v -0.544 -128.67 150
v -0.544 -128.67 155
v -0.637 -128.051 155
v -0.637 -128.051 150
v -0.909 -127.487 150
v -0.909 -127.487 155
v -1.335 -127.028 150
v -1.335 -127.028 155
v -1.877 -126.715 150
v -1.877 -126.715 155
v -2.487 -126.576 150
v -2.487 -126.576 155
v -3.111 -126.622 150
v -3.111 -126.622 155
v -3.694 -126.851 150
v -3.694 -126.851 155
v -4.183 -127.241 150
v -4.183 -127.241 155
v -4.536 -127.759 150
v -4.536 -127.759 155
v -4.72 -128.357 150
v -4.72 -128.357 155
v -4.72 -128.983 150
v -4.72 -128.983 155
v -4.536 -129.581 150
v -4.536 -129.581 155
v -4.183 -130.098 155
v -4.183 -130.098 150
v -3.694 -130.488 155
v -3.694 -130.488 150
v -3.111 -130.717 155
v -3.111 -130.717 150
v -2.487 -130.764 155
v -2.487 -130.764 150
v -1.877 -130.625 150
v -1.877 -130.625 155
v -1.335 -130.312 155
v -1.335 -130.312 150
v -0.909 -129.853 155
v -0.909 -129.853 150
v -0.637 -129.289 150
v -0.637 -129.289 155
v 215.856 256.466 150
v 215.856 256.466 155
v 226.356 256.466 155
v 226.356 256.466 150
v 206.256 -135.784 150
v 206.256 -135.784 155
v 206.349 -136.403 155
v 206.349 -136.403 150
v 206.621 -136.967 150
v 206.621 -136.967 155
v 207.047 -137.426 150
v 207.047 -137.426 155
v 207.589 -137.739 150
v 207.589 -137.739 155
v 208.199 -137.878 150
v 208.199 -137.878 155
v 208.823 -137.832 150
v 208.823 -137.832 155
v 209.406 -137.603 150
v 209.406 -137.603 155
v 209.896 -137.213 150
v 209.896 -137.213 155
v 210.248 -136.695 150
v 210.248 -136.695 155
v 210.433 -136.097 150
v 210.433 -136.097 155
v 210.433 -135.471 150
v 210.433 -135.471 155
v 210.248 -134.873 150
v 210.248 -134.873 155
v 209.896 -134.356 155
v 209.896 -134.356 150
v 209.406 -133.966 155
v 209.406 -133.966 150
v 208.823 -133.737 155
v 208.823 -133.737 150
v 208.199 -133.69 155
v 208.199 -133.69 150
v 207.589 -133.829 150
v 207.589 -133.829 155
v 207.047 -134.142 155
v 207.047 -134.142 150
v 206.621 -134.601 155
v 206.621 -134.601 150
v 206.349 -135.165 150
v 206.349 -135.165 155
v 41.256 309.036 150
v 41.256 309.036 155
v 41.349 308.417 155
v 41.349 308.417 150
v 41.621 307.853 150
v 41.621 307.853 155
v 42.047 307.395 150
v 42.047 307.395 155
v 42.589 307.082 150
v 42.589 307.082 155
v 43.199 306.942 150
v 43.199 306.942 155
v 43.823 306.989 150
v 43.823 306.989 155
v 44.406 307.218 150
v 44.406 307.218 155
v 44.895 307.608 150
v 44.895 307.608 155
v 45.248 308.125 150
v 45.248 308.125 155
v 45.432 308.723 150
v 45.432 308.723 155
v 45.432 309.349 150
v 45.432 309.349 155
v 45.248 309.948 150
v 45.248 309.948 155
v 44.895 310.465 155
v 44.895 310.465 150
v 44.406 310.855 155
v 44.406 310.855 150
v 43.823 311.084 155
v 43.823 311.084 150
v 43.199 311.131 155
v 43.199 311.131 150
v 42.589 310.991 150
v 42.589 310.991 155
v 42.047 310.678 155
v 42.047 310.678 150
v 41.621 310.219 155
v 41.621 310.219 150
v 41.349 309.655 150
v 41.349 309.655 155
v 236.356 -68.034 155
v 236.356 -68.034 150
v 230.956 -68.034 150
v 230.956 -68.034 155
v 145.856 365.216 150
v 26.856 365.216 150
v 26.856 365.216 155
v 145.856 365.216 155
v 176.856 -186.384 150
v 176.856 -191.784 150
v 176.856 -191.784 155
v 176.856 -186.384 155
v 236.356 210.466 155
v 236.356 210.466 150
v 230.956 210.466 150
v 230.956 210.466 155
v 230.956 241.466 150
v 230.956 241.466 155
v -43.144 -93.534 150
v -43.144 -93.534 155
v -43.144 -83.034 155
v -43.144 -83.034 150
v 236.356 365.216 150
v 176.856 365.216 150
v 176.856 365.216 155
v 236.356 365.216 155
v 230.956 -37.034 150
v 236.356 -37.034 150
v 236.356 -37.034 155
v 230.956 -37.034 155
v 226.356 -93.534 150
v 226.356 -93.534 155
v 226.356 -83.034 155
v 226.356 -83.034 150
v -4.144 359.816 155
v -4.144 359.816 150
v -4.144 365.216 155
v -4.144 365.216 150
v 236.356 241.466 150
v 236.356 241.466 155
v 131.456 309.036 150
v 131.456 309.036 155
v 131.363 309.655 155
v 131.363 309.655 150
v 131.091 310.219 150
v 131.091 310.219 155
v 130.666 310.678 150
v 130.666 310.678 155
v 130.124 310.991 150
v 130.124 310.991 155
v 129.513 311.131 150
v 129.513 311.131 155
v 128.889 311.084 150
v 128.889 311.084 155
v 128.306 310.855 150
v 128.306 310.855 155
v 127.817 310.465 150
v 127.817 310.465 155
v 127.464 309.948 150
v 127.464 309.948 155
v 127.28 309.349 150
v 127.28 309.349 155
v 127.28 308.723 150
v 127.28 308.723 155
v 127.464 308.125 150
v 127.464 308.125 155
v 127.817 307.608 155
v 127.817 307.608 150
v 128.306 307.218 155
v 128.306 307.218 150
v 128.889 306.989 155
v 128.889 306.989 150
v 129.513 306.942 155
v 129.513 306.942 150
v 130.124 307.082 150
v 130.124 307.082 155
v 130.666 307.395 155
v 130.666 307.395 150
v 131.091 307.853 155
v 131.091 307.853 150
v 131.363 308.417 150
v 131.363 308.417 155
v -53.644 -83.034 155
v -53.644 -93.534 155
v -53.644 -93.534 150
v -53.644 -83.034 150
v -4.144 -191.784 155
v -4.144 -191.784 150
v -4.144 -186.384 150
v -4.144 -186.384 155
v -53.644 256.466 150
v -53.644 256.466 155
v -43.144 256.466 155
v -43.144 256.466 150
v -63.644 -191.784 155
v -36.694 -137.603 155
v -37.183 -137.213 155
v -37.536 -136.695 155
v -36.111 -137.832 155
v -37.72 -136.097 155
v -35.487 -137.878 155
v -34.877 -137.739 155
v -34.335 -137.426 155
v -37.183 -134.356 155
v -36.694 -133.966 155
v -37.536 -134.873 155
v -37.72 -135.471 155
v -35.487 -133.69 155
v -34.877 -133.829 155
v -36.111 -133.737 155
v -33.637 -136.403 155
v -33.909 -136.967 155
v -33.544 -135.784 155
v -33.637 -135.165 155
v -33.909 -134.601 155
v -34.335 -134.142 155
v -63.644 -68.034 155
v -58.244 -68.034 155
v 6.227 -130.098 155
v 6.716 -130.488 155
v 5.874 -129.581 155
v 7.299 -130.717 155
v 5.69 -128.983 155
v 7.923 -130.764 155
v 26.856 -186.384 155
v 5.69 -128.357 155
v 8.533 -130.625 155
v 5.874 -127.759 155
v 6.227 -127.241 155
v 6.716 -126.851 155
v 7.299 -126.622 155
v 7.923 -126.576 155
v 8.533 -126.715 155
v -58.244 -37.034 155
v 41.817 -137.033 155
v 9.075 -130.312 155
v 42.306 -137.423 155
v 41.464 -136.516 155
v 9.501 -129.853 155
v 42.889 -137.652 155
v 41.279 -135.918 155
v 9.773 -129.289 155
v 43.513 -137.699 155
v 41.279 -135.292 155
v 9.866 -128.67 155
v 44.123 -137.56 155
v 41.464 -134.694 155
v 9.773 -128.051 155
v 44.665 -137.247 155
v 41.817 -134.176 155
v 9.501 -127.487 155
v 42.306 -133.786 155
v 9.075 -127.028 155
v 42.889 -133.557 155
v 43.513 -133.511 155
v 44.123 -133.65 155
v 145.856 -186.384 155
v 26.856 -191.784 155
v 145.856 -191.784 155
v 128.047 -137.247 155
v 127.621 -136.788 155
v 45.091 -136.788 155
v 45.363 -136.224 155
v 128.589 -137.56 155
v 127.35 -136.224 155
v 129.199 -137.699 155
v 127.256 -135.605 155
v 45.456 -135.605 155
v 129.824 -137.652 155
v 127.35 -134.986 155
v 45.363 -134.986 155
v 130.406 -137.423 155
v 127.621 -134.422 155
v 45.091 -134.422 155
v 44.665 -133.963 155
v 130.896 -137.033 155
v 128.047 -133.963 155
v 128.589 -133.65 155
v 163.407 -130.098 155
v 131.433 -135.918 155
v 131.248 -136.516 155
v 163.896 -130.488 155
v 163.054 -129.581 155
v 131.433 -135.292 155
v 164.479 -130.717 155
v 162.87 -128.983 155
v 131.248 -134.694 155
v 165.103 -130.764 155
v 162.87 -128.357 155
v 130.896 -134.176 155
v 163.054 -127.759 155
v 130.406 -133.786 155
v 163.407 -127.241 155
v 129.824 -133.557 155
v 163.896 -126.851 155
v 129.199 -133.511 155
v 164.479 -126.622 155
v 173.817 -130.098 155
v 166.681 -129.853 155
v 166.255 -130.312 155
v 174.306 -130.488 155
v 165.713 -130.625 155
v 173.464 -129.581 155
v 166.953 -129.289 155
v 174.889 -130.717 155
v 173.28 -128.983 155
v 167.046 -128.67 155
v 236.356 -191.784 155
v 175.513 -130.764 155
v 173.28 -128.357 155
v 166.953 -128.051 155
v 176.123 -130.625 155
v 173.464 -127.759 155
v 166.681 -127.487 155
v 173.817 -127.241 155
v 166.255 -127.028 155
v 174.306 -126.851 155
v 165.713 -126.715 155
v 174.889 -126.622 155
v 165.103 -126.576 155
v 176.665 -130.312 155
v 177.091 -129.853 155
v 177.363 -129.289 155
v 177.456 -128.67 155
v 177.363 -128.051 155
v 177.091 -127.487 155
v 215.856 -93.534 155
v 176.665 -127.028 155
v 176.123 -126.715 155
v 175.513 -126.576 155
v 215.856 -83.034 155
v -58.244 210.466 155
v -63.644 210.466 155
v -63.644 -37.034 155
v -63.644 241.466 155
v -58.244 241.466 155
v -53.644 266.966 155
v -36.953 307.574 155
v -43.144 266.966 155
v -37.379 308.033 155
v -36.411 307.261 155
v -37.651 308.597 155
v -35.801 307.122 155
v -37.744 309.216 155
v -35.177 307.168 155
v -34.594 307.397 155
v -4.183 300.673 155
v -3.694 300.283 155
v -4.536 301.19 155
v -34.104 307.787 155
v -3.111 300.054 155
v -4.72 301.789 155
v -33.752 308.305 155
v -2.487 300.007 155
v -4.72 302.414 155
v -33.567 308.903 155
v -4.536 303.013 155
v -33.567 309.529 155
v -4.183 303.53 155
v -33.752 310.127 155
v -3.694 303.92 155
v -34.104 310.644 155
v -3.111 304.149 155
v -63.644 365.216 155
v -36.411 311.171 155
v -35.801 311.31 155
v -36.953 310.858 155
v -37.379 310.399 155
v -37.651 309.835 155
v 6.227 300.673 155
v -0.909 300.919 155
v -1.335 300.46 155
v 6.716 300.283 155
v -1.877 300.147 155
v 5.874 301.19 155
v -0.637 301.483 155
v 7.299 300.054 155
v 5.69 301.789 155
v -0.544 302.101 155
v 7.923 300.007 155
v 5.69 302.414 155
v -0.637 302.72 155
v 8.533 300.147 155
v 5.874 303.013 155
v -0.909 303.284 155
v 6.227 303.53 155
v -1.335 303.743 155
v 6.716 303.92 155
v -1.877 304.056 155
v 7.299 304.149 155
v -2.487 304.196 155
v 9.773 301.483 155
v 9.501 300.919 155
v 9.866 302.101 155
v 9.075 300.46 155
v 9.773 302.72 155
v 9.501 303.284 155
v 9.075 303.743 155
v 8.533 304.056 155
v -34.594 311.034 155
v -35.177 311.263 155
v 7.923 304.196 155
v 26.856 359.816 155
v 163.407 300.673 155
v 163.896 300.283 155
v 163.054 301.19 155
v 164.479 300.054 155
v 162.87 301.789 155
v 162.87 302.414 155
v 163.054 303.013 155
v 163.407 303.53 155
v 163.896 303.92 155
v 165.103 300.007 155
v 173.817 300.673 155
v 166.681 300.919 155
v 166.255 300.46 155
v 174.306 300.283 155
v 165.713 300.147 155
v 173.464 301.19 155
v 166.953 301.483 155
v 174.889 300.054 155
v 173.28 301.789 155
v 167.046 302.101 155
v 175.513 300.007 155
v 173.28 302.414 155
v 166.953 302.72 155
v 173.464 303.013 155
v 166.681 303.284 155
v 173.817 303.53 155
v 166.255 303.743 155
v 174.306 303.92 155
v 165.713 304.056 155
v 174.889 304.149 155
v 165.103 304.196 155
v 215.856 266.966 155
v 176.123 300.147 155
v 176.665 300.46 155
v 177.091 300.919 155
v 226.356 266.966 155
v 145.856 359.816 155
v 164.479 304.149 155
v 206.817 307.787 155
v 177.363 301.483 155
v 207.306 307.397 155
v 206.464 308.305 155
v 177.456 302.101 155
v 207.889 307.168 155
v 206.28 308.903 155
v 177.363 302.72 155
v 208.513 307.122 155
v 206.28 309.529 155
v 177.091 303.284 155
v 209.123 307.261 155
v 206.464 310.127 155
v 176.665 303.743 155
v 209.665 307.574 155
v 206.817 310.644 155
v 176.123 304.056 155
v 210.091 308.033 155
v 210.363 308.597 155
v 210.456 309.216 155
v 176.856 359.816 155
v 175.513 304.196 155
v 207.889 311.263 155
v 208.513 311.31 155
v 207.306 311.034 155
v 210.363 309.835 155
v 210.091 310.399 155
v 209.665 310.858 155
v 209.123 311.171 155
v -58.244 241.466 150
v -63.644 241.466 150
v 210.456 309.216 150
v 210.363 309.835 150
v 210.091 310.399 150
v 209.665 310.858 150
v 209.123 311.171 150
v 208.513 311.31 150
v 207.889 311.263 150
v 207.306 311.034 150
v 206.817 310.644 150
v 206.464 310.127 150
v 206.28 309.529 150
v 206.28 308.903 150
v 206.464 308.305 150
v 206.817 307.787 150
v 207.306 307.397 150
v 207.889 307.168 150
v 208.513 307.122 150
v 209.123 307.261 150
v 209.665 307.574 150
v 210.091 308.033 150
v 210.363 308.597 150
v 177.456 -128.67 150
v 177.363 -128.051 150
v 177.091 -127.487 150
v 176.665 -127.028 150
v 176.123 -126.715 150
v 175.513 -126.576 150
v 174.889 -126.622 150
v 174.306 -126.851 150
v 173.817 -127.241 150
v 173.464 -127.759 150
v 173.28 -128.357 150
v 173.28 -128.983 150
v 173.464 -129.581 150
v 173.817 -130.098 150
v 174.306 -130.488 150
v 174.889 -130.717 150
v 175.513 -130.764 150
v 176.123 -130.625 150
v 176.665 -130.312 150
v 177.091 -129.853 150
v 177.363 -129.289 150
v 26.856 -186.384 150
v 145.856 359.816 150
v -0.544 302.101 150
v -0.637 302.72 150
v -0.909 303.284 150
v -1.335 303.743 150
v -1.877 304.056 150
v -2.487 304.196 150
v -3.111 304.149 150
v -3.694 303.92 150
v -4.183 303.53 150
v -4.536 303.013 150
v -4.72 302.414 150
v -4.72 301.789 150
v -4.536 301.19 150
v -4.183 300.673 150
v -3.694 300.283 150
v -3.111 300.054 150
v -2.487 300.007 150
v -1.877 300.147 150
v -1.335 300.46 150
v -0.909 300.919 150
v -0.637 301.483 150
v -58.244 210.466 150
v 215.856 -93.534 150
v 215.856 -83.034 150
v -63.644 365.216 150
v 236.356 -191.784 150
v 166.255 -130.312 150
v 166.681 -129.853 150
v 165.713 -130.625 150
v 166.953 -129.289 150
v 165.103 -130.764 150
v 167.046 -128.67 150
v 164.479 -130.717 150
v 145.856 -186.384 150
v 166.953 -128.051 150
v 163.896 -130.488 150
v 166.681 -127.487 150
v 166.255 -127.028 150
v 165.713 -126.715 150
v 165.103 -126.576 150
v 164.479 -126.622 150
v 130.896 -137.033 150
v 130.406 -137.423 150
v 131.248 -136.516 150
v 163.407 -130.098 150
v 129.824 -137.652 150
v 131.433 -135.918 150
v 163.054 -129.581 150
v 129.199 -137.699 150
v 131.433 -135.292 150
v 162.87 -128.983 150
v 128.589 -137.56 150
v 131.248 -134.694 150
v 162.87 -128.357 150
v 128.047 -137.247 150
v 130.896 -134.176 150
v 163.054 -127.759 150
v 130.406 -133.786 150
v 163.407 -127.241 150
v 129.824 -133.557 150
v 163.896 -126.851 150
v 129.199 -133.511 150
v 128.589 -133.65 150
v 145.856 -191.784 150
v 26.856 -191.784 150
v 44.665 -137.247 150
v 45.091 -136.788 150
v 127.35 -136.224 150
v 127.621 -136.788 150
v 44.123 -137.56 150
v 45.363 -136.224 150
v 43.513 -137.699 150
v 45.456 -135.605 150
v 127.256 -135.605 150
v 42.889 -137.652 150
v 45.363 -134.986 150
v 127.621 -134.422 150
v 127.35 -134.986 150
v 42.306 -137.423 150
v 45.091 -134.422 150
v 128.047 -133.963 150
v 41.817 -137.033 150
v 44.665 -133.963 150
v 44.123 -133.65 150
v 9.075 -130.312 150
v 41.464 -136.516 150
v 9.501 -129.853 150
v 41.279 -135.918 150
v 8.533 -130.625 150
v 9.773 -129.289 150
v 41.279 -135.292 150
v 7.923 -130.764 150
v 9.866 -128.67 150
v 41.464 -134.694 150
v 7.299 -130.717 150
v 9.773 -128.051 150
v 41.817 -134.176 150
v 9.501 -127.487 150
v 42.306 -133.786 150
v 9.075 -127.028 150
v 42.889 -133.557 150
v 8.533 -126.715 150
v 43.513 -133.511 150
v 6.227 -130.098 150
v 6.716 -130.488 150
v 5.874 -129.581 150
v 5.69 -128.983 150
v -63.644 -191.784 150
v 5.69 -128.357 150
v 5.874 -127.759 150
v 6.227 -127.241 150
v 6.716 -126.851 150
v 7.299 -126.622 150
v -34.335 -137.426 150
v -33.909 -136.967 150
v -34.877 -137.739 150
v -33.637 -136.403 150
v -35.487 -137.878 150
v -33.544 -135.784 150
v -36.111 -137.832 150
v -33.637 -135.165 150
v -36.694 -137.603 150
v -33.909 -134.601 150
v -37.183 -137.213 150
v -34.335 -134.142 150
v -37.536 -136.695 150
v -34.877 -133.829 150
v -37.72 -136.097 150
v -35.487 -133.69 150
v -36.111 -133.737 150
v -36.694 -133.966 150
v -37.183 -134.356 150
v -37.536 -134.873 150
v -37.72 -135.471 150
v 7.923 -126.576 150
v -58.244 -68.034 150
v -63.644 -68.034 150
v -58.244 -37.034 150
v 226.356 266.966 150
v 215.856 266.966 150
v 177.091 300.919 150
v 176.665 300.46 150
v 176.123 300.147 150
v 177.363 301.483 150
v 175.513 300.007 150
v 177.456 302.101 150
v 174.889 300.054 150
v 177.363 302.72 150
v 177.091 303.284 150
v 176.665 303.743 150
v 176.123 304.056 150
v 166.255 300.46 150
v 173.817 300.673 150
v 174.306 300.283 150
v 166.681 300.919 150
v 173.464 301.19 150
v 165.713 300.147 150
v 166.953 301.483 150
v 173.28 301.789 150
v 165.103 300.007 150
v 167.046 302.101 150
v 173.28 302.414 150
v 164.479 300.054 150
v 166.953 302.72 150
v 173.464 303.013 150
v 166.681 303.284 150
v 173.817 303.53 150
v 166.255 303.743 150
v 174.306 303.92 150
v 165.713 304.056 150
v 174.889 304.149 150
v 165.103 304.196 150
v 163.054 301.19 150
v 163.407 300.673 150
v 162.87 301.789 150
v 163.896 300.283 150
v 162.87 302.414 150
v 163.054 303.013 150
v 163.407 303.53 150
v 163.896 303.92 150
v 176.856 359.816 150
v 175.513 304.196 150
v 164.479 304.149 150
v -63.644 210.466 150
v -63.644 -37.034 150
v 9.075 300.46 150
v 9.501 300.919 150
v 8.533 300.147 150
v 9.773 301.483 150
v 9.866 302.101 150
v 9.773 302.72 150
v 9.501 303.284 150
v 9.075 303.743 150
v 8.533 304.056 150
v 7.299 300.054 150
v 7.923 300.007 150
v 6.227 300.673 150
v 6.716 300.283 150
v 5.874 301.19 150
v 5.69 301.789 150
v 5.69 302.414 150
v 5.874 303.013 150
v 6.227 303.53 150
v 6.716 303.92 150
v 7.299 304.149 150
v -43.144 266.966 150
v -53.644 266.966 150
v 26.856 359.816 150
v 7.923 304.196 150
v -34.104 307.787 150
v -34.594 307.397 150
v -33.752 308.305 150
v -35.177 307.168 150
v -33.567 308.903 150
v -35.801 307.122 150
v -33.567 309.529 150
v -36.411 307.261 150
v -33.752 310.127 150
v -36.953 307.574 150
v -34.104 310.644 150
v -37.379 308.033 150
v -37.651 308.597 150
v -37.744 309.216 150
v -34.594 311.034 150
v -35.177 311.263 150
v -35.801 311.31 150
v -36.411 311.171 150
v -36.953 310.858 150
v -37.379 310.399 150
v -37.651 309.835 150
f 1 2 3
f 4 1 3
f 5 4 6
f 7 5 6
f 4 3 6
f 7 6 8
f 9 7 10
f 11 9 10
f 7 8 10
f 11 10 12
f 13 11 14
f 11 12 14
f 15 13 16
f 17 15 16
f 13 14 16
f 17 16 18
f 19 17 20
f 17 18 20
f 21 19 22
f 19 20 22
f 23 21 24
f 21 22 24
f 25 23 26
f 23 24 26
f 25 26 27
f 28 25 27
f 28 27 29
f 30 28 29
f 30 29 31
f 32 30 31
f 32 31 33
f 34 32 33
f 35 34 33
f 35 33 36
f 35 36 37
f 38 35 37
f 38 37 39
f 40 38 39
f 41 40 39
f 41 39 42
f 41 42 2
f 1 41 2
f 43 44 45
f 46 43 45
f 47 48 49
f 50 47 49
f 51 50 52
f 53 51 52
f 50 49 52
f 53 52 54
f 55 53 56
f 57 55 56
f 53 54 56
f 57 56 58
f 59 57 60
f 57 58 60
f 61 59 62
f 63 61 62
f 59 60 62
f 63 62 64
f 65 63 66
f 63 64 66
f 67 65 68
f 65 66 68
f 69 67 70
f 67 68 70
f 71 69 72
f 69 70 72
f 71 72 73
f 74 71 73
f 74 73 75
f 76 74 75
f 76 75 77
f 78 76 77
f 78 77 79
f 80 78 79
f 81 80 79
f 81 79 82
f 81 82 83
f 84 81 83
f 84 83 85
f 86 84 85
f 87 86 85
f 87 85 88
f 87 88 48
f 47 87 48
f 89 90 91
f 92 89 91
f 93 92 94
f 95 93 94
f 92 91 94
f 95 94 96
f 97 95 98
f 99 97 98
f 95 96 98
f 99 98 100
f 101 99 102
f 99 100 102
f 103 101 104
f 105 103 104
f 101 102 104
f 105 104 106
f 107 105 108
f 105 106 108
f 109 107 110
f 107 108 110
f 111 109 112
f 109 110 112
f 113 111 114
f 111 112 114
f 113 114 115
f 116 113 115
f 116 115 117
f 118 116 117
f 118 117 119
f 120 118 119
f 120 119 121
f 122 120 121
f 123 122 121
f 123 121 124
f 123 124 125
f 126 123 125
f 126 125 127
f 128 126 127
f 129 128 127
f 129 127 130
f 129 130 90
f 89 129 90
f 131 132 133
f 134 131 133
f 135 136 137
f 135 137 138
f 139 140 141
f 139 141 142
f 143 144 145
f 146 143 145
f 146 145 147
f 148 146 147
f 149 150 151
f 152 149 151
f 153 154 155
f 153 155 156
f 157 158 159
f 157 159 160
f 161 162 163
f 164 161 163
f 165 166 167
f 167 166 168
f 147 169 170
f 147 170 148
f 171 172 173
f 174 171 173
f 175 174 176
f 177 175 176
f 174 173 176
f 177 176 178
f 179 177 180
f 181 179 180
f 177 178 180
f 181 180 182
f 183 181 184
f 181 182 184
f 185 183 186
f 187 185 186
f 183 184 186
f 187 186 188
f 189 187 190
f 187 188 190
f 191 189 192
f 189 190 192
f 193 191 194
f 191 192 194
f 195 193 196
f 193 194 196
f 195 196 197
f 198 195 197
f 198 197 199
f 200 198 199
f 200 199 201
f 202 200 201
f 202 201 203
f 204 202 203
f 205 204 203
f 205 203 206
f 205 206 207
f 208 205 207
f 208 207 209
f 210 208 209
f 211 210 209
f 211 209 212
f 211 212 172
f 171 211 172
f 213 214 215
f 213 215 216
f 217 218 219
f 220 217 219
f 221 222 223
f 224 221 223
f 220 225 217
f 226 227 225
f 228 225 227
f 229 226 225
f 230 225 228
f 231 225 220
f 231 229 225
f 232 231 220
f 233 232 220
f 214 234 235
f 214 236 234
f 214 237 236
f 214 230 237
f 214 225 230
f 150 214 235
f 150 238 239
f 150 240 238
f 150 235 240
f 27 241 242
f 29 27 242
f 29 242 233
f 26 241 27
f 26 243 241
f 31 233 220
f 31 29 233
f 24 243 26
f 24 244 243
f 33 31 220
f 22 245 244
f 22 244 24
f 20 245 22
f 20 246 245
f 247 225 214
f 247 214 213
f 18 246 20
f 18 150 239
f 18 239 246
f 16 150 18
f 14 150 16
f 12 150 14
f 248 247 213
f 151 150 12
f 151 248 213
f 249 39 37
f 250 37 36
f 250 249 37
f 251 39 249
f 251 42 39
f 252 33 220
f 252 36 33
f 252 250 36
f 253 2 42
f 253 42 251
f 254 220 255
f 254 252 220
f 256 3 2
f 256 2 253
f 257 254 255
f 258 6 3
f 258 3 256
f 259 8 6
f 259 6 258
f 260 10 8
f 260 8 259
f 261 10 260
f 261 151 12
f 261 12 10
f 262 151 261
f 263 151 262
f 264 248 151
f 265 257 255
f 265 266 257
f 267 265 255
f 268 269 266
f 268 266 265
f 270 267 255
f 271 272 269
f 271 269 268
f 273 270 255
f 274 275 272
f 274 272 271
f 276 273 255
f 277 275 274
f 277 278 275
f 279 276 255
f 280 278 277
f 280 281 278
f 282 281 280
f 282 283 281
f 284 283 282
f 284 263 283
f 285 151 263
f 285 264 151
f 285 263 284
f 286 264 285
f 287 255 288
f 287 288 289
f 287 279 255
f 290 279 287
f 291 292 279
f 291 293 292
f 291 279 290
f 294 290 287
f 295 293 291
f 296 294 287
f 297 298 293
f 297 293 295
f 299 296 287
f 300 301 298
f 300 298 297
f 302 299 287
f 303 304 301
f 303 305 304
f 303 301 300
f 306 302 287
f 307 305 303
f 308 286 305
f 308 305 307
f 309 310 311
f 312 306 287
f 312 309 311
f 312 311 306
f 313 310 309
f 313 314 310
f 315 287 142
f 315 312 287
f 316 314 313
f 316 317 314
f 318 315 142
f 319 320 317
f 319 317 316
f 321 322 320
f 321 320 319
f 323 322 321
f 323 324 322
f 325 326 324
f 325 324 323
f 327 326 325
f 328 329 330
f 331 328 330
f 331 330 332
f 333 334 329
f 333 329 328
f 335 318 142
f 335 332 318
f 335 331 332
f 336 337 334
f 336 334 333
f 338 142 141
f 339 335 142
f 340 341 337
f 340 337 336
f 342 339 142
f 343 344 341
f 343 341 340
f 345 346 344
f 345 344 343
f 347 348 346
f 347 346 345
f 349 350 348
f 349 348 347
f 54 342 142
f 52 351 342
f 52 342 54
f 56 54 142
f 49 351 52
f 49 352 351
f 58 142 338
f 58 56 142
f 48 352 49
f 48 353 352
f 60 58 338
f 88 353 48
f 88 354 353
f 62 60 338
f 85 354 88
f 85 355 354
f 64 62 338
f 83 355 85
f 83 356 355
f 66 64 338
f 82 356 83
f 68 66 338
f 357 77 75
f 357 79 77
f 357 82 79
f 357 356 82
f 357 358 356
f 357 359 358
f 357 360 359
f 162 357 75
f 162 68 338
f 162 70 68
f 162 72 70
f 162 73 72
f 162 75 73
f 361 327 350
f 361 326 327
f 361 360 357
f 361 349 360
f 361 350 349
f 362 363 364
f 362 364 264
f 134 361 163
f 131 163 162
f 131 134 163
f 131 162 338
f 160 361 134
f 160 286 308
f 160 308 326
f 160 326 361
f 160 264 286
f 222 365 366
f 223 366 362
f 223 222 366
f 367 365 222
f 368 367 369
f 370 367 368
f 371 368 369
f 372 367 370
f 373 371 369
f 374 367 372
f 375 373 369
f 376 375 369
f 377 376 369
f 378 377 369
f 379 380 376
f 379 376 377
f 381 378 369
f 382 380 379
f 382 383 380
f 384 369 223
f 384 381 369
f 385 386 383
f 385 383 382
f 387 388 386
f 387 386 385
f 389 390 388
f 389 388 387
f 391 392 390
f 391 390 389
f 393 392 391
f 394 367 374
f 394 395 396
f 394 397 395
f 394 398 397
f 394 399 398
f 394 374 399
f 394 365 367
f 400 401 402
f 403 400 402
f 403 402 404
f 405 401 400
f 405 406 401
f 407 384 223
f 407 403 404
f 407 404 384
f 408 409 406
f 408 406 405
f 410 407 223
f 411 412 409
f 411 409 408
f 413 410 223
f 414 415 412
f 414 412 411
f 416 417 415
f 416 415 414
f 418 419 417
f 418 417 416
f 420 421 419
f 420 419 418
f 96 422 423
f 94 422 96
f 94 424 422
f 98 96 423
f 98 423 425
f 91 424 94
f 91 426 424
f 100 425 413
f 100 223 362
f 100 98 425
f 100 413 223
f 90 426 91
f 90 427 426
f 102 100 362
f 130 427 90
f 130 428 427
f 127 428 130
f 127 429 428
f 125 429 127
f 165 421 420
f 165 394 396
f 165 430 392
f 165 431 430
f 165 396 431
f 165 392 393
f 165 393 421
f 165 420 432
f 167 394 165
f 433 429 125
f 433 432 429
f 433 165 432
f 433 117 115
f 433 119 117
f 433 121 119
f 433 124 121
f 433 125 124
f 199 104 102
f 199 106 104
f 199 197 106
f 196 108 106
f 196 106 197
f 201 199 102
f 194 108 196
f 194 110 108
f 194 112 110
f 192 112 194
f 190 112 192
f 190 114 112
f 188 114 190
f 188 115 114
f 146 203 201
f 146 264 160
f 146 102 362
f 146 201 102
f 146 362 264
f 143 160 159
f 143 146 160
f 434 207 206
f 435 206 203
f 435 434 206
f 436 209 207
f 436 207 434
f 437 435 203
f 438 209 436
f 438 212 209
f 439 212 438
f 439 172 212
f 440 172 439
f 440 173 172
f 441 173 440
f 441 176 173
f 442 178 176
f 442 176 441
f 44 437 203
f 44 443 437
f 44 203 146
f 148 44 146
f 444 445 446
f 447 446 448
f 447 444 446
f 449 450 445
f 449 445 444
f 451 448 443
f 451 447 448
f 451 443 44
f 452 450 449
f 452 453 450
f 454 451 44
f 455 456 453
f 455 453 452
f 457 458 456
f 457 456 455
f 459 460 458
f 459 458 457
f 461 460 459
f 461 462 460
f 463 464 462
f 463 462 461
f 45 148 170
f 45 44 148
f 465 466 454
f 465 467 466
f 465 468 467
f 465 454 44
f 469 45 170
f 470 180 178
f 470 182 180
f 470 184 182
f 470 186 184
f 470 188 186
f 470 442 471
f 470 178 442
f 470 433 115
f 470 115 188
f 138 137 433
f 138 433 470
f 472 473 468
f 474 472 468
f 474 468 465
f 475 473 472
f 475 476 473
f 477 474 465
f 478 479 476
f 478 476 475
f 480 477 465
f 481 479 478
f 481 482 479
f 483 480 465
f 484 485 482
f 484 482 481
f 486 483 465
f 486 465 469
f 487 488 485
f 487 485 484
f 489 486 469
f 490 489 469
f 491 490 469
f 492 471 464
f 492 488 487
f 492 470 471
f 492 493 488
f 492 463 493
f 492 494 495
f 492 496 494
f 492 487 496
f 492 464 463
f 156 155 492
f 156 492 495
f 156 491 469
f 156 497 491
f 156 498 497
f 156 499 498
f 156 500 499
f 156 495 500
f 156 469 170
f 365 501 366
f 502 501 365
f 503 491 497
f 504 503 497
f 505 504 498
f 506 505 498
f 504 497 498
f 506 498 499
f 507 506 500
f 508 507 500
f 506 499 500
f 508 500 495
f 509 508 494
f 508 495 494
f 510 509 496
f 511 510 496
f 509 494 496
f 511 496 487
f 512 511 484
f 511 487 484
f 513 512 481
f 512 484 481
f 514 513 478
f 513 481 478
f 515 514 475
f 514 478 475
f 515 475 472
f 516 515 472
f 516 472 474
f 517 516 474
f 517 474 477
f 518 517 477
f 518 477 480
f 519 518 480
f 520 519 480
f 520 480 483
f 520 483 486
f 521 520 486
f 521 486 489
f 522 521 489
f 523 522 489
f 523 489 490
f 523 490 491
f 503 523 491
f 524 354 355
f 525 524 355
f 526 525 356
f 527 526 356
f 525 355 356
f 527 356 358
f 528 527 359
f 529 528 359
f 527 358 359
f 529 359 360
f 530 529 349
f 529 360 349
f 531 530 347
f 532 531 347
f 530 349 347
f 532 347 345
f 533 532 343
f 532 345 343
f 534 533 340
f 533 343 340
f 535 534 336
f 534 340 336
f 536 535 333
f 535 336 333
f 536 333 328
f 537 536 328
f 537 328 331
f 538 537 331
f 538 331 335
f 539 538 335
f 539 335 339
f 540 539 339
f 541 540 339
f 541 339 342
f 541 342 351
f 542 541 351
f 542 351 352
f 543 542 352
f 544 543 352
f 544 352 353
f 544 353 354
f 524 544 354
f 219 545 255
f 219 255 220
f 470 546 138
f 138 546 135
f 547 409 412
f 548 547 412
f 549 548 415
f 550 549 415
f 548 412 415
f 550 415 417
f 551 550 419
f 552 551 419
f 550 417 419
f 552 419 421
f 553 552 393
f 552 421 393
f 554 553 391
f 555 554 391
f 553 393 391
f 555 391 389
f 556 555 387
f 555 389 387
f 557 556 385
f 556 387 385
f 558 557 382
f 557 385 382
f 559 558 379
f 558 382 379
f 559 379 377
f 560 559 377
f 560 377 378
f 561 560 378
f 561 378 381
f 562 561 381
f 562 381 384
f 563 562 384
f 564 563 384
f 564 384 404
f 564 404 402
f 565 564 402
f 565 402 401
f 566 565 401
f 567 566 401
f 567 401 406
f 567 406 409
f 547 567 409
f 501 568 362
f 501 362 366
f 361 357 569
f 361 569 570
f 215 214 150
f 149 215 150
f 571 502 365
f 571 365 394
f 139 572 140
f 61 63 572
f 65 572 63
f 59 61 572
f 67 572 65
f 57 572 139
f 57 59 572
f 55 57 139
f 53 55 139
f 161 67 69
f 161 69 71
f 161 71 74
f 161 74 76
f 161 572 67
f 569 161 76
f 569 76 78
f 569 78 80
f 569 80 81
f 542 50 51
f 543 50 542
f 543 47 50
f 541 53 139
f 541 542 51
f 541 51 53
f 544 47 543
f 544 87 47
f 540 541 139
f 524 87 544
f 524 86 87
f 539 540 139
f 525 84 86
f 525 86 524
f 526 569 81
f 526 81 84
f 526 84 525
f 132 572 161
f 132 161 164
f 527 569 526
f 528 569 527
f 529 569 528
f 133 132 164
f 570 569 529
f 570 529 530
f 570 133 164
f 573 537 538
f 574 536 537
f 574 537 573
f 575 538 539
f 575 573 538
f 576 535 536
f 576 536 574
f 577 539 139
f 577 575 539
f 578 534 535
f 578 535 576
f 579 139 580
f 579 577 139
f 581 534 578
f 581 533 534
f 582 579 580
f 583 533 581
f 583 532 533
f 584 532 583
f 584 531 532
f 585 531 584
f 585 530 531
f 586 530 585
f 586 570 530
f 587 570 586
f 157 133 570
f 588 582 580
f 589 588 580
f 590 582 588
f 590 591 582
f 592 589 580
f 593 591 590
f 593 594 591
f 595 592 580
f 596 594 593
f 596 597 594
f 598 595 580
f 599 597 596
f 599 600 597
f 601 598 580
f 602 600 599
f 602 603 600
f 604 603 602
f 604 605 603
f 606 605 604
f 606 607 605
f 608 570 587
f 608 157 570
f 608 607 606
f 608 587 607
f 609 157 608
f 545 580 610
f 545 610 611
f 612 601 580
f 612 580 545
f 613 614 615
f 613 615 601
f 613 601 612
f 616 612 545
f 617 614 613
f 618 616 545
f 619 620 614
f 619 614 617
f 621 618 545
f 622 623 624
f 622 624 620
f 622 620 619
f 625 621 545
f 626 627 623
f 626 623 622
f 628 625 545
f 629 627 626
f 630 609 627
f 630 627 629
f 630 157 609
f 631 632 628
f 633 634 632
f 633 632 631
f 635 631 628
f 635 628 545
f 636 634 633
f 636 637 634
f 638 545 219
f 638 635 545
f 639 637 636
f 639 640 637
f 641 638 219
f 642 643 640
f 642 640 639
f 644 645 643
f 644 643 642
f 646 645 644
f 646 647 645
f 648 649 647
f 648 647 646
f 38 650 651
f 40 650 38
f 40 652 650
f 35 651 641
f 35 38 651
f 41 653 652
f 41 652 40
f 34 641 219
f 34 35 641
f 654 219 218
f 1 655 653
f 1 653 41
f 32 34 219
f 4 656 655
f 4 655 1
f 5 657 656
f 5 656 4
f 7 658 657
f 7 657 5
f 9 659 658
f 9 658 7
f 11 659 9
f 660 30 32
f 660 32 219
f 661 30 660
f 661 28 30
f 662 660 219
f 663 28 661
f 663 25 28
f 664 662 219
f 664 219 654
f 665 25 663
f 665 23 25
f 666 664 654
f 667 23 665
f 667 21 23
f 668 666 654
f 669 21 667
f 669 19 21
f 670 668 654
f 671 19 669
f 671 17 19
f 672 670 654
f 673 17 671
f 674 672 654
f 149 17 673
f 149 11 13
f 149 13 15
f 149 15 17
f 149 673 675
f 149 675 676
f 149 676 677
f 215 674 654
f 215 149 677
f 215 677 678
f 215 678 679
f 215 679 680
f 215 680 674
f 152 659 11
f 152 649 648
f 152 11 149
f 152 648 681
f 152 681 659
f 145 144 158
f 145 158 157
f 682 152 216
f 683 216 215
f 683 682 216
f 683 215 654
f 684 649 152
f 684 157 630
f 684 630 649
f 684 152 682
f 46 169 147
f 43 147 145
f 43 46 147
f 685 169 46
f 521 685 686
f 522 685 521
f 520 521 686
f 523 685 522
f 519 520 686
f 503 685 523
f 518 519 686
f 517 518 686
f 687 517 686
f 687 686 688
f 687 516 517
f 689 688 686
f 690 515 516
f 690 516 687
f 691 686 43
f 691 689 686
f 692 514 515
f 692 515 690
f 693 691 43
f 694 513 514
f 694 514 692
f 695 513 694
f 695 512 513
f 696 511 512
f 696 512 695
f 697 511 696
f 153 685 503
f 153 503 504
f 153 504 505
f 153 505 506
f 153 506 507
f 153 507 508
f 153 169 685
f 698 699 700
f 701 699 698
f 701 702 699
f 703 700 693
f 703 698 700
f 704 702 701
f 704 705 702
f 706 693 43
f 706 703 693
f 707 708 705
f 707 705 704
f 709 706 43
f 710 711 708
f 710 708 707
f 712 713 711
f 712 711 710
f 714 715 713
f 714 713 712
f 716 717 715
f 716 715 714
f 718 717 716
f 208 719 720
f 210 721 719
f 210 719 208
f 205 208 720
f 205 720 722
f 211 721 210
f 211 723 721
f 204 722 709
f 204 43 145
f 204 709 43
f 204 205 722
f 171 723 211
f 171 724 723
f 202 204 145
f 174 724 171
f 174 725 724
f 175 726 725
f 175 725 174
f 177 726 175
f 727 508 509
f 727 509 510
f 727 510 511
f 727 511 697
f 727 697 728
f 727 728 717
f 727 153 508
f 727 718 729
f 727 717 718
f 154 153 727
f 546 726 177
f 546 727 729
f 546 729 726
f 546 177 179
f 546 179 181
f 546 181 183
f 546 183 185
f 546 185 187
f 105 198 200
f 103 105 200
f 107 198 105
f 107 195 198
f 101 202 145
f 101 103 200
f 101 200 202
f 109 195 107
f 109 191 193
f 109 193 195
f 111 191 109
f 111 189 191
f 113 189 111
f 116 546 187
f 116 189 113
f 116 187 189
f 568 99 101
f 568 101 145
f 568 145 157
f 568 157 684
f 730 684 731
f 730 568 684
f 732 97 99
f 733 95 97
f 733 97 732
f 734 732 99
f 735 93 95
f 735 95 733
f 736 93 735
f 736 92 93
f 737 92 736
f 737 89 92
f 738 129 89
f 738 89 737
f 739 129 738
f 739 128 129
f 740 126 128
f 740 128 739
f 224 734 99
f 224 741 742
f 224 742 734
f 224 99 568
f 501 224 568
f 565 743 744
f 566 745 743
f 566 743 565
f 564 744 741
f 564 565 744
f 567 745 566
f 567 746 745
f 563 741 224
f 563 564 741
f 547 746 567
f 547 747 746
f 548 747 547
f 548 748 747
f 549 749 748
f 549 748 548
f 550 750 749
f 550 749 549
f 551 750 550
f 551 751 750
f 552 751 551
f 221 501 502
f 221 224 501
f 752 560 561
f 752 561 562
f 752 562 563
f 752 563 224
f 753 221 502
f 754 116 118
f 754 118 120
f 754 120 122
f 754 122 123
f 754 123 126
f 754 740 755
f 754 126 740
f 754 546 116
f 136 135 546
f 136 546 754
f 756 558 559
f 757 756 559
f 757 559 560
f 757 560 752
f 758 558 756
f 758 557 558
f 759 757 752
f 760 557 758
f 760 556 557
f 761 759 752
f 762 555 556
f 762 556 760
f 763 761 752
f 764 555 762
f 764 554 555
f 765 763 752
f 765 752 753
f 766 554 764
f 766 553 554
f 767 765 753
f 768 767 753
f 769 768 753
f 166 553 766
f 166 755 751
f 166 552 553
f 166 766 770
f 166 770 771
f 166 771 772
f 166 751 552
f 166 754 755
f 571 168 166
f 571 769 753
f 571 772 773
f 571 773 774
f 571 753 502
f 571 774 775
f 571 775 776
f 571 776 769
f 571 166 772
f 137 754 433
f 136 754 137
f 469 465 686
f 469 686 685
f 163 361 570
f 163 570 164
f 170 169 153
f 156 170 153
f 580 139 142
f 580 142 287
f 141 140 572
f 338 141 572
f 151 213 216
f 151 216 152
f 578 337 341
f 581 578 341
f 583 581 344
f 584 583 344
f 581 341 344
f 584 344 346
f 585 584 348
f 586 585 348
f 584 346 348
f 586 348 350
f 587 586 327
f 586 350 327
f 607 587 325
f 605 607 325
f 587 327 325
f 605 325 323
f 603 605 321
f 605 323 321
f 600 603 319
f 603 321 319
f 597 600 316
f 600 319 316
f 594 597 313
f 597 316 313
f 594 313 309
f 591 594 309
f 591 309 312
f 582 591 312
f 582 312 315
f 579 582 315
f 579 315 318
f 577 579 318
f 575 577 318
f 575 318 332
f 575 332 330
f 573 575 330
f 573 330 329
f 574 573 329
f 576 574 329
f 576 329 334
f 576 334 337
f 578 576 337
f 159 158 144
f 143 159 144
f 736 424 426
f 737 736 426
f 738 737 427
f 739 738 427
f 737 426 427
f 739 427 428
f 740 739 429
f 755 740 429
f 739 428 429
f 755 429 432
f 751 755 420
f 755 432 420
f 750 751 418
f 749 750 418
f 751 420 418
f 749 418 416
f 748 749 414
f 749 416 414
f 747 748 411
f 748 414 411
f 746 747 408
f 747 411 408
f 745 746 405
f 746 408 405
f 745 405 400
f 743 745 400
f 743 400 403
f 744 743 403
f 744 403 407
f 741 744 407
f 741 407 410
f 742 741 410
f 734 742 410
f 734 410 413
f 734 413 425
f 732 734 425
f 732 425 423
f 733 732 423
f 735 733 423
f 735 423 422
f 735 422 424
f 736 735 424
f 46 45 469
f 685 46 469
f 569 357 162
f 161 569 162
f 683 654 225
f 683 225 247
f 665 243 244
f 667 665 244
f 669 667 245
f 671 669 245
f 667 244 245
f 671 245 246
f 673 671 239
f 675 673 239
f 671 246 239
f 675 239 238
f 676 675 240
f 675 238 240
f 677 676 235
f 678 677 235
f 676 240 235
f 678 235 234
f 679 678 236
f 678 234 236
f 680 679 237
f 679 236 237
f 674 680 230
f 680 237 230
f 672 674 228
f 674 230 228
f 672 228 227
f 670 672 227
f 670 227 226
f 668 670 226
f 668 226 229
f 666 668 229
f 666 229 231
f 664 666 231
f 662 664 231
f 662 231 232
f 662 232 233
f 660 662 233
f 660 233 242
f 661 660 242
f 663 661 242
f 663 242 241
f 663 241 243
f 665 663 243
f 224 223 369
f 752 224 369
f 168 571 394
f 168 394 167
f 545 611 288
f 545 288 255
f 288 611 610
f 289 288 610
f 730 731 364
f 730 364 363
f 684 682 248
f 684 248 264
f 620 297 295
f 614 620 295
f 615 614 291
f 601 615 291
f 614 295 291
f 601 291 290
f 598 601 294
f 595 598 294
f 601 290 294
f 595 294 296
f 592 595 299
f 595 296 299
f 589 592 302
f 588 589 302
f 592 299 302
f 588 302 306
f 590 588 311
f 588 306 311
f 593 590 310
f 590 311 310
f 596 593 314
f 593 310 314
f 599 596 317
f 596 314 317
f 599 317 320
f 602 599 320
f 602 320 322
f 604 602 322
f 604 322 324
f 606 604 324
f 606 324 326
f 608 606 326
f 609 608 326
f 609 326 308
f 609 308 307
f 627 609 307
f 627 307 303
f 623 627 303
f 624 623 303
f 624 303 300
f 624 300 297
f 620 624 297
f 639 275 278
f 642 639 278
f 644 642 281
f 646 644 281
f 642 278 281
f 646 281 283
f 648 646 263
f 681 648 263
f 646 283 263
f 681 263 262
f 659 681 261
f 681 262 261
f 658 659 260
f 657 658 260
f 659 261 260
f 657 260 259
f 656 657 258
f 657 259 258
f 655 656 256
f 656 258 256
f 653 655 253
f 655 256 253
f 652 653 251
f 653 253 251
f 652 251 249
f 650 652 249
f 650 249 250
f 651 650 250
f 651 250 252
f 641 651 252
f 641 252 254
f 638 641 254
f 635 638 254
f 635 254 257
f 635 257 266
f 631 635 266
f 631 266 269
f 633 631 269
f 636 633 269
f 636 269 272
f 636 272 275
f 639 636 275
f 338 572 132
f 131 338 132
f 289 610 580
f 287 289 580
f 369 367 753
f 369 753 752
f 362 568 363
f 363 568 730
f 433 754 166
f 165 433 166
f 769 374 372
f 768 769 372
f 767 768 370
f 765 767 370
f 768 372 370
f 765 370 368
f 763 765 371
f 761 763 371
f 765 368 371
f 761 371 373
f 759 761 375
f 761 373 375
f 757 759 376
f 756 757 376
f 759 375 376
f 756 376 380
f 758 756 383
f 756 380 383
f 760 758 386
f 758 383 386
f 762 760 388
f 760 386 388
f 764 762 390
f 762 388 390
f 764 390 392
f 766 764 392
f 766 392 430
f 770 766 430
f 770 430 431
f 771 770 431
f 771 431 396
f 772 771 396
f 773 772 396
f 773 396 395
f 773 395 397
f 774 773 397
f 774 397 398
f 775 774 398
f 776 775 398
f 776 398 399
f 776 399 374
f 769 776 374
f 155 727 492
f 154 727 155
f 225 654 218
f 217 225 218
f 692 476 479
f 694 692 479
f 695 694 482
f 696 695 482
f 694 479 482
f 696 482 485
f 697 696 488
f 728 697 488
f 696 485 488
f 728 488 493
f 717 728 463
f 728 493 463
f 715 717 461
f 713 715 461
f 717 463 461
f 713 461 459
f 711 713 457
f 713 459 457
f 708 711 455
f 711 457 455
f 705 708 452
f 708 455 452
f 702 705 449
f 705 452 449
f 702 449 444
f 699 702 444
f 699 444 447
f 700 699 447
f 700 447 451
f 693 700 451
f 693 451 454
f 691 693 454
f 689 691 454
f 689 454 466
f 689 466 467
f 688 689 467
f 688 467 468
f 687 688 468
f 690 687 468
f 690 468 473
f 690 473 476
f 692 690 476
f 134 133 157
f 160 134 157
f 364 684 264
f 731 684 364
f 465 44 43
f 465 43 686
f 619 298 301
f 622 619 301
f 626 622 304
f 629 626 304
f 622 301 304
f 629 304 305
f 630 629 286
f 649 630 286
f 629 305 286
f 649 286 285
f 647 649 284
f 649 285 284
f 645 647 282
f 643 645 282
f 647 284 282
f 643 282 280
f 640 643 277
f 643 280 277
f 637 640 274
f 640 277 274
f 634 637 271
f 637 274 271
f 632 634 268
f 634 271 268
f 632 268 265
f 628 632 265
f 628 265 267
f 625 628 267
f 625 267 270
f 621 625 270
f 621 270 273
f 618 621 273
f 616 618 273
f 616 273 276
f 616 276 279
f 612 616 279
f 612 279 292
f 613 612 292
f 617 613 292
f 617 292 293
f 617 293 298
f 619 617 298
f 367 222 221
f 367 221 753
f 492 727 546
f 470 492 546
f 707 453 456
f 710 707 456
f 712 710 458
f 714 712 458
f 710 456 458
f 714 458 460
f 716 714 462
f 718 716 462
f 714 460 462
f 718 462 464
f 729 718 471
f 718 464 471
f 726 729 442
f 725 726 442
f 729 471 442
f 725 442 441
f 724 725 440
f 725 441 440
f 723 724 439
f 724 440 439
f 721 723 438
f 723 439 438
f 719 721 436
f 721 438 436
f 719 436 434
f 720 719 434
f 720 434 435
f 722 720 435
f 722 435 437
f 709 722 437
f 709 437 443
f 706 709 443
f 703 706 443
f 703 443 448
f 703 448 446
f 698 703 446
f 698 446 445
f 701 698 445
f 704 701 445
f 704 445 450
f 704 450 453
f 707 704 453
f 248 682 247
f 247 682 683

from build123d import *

# Parameters (mm, degrees)
SKETCH1_W           = 300
SKETCH1_H           = 557
SKETCH1_W_2         = 290
SKETCH1_H_2         = 547
BOSS_EXTRUDE1_DEPTH = 150
SKETCH2_W           = 300
SKETCH2_H           = 557
BOSS_EXTRUDE2_DEPTH = 5
SKETCH5_R           = 2.1
CUT_EXTRUDE3_DEPTH  = 10
SKETCH6_W           = 10.5
SKETCH6_H           = 10.5
CUT_EXTRUDE4_DEPTH  = 10
SKETCH8_R           = 1.25
CUT_EXTRUDE6_DEPTH  = 663
SKETCH9_W           = 300
SKETCH9_H           = 557
CUT_EXTRUDE7_DEPTH  = 150
SKETCH10_W          = 31
SKETCH10_H          = 10.8
CUT_EXTRUDE8_DEPTH  = 5
SKETCH13_W          = 10.8
SKETCH13_H          = 31
CUT_EXTRUDE10_DEPTH = 5
SKETCH16_R          = 2.1
CUT_EXTRUDE12_DEPTH = 10


with BuildPart() as part:
    # Sketch1 → Boss-Extrude1 (new body)
    with BuildSketch(Plane.XY):
        with Locations((86.356154307, 86.715846067)):
            Rectangle(SKETCH1_W, SKETCH1_H)
        with Locations((86.356154307, 86.715846067)):
            Rectangle(SKETCH1_W_2, SKETCH1_H_2, mode=Mode.SUBTRACT)
    extrude(amount=BOSS_EXTRUDE1_DEPTH)

    # Sketch2 → Boss-Extrude2 (add)
    with BuildSketch(Plane.XY.offset(150)):
        with Locations((86.356154307, 86.715846067)):
            Rectangle(SKETCH2_W, SKETCH2_H)
    extrude(amount=BOSS_EXTRUDE2_DEPTH)

    # Sketch5 → Cut-Extrude3 (cut)
    with BuildSketch(Plane.XY.offset(155)):
        with Locations((7.766154307, 302.101499848)):
            Circle(SKETCH5_R)
        with Locations((-2.643845693, 302.101499848)):
            Circle(SKETCH5_R)
        with Locations((175.356154307, 302.101499848)):
            Circle(SKETCH5_R)
        with Locations((164.946154307, 302.101499848)):
            Circle(SKETCH5_R)
        with Locations((-2.643845693, -128.669807714)):
            Circle(SKETCH5_R)
        with Locations((7.766154307, -128.669807714)):
            Circle(SKETCH5_R)
        with Locations((164.946154307, -128.669807714)):
            Circle(SKETCH5_R)
        with Locations((175.356154307, -128.669807714)):
            Circle(SKETCH5_R)
    extrude(amount=-CUT_EXTRUDE3_DEPTH, mode=Mode.SUBTRACT)

    # Sketch6 → Cut-Extrude4 (cut)
    with BuildSketch(Plane.XY.offset(155)):
        with Locations((-48.393845693, 261.715846067)):
            Rectangle(SKETCH6_W, SKETCH6_H)
        with Locations((221.106154307, 261.715846067)):
            Rectangle(SKETCH6_W, SKETCH6_H)
        with Locations((221.106154307, -88.284153933)):
            Rectangle(SKETCH6_W, SKETCH6_H)
        with Locations((-48.393845693, -88.284153933)):
            Rectangle(SKETCH6_W, SKETCH6_H)
    extrude(amount=-CUT_EXTRUDE4_DEPTH, mode=Mode.SUBTRACT)

    # Sketch8 → Cut-Extrude6 (cut)
    with BuildSketch(Plane.XZ.offset(191.784153933)):
        with Locations(Location((91.506154307, 9.8, 0), (0, 0, 270))):
            Circle(SKETCH8_R)
        with Locations(Location((81.206154307, 9.8, 0), (0, 0, 270))):
            Circle(SKETCH8_R)
    extrude(amount=-CUT_EXTRUDE6_DEPTH, mode=Mode.SUBTRACT)

    # Sketch9 → Cut-Extrude7 (cut)
    with BuildSketch(Plane(origin=(0, 0, 0), x_dir=(-1, 0, 0), z_dir=(0, 0, -1))):
        with Locations((-86.356154307, 86.715846067)):
            Rectangle(SKETCH9_W, SKETCH9_H)
    extrude(amount=-CUT_EXTRUDE7_DEPTH, mode=Mode.SUBTRACT)

    # Sketch10 → Cut-Extrude8 (cut)
    with BuildSketch(Plane(origin=(0, 0, 150), x_dir=(-1, 0, 0), z_dir=(0, 0, -1))):
        with Locations((-11.356154307, -191.784153933)):
            Rectangle(SKETCH10_W, SKETCH10_H)
        with Locations((-161.356154307, -191.784153933)):
            Rectangle(SKETCH10_W, SKETCH10_H)
        with Locations((-161.356154307, 365.215846067)):
            Rectangle(SKETCH10_W, SKETCH10_H)
        with Locations((-11.356154307, 365.215846067)):
            Rectangle(SKETCH10_W, SKETCH10_H)
    extrude(amount=-CUT_EXTRUDE8_DEPTH, mode=Mode.SUBTRACT)

    # Sketch13 → Cut-Extrude10 (cut)
    with BuildSketch(Plane(origin=(0, 0, 150), x_dir=(-1, 0, 0), z_dir=(0, 0, -1))):
        with Locations((63.643845693, -52.534153933)):
            Rectangle(SKETCH13_W, SKETCH13_H)
        with Locations((63.643845693, 225.965846067)):
            Rectangle(SKETCH13_W, SKETCH13_H)
        with Locations((-236.356154307, 225.965846067)):
            Rectangle(SKETCH13_W, SKETCH13_H)
        with Locations((-236.356154307, -52.534153933)):
            Rectangle(SKETCH13_W, SKETCH13_H)
    extrude(amount=-CUT_EXTRUDE10_DEPTH, mode=Mode.SUBTRACT)

    # Sketch16 → Cut-Extrude12 (cut)
    with BuildSketch(Plane.XY.offset(155)):
        with Locations((208.356154307, 309.215846067)):
            Circle(SKETCH16_R)
        with Locations((129.356358153, 309.036381593)):
            Circle(SKETCH16_R)
        with Locations(Location((43.355950462, 309.036381593, 0), (0, 0, 180))):
            Circle(SKETCH16_R)
        with Locations(Location((-35.643845693, 309.215846067, 0), (0, 0, 180))):
            Circle(SKETCH16_R)
        with Locations((-35.643845693, -135.784153933)):
            Circle(SKETCH16_R)
        with Locations((43.355950462, -135.604689459)):
            Circle(SKETCH16_R)
        with Locations(Location((129.356358153, -135.604689459, 0), (0, 0, 180))):
            Circle(SKETCH16_R)
        with Locations(Location((208.356154307, -135.784153933, 0), (0, 0, 180))):
            Circle(SKETCH16_R)
    extrude(amount=-CUT_EXTRUDE12_DEPTH, mode=Mode.SUBTRACT)


solid = part.part
